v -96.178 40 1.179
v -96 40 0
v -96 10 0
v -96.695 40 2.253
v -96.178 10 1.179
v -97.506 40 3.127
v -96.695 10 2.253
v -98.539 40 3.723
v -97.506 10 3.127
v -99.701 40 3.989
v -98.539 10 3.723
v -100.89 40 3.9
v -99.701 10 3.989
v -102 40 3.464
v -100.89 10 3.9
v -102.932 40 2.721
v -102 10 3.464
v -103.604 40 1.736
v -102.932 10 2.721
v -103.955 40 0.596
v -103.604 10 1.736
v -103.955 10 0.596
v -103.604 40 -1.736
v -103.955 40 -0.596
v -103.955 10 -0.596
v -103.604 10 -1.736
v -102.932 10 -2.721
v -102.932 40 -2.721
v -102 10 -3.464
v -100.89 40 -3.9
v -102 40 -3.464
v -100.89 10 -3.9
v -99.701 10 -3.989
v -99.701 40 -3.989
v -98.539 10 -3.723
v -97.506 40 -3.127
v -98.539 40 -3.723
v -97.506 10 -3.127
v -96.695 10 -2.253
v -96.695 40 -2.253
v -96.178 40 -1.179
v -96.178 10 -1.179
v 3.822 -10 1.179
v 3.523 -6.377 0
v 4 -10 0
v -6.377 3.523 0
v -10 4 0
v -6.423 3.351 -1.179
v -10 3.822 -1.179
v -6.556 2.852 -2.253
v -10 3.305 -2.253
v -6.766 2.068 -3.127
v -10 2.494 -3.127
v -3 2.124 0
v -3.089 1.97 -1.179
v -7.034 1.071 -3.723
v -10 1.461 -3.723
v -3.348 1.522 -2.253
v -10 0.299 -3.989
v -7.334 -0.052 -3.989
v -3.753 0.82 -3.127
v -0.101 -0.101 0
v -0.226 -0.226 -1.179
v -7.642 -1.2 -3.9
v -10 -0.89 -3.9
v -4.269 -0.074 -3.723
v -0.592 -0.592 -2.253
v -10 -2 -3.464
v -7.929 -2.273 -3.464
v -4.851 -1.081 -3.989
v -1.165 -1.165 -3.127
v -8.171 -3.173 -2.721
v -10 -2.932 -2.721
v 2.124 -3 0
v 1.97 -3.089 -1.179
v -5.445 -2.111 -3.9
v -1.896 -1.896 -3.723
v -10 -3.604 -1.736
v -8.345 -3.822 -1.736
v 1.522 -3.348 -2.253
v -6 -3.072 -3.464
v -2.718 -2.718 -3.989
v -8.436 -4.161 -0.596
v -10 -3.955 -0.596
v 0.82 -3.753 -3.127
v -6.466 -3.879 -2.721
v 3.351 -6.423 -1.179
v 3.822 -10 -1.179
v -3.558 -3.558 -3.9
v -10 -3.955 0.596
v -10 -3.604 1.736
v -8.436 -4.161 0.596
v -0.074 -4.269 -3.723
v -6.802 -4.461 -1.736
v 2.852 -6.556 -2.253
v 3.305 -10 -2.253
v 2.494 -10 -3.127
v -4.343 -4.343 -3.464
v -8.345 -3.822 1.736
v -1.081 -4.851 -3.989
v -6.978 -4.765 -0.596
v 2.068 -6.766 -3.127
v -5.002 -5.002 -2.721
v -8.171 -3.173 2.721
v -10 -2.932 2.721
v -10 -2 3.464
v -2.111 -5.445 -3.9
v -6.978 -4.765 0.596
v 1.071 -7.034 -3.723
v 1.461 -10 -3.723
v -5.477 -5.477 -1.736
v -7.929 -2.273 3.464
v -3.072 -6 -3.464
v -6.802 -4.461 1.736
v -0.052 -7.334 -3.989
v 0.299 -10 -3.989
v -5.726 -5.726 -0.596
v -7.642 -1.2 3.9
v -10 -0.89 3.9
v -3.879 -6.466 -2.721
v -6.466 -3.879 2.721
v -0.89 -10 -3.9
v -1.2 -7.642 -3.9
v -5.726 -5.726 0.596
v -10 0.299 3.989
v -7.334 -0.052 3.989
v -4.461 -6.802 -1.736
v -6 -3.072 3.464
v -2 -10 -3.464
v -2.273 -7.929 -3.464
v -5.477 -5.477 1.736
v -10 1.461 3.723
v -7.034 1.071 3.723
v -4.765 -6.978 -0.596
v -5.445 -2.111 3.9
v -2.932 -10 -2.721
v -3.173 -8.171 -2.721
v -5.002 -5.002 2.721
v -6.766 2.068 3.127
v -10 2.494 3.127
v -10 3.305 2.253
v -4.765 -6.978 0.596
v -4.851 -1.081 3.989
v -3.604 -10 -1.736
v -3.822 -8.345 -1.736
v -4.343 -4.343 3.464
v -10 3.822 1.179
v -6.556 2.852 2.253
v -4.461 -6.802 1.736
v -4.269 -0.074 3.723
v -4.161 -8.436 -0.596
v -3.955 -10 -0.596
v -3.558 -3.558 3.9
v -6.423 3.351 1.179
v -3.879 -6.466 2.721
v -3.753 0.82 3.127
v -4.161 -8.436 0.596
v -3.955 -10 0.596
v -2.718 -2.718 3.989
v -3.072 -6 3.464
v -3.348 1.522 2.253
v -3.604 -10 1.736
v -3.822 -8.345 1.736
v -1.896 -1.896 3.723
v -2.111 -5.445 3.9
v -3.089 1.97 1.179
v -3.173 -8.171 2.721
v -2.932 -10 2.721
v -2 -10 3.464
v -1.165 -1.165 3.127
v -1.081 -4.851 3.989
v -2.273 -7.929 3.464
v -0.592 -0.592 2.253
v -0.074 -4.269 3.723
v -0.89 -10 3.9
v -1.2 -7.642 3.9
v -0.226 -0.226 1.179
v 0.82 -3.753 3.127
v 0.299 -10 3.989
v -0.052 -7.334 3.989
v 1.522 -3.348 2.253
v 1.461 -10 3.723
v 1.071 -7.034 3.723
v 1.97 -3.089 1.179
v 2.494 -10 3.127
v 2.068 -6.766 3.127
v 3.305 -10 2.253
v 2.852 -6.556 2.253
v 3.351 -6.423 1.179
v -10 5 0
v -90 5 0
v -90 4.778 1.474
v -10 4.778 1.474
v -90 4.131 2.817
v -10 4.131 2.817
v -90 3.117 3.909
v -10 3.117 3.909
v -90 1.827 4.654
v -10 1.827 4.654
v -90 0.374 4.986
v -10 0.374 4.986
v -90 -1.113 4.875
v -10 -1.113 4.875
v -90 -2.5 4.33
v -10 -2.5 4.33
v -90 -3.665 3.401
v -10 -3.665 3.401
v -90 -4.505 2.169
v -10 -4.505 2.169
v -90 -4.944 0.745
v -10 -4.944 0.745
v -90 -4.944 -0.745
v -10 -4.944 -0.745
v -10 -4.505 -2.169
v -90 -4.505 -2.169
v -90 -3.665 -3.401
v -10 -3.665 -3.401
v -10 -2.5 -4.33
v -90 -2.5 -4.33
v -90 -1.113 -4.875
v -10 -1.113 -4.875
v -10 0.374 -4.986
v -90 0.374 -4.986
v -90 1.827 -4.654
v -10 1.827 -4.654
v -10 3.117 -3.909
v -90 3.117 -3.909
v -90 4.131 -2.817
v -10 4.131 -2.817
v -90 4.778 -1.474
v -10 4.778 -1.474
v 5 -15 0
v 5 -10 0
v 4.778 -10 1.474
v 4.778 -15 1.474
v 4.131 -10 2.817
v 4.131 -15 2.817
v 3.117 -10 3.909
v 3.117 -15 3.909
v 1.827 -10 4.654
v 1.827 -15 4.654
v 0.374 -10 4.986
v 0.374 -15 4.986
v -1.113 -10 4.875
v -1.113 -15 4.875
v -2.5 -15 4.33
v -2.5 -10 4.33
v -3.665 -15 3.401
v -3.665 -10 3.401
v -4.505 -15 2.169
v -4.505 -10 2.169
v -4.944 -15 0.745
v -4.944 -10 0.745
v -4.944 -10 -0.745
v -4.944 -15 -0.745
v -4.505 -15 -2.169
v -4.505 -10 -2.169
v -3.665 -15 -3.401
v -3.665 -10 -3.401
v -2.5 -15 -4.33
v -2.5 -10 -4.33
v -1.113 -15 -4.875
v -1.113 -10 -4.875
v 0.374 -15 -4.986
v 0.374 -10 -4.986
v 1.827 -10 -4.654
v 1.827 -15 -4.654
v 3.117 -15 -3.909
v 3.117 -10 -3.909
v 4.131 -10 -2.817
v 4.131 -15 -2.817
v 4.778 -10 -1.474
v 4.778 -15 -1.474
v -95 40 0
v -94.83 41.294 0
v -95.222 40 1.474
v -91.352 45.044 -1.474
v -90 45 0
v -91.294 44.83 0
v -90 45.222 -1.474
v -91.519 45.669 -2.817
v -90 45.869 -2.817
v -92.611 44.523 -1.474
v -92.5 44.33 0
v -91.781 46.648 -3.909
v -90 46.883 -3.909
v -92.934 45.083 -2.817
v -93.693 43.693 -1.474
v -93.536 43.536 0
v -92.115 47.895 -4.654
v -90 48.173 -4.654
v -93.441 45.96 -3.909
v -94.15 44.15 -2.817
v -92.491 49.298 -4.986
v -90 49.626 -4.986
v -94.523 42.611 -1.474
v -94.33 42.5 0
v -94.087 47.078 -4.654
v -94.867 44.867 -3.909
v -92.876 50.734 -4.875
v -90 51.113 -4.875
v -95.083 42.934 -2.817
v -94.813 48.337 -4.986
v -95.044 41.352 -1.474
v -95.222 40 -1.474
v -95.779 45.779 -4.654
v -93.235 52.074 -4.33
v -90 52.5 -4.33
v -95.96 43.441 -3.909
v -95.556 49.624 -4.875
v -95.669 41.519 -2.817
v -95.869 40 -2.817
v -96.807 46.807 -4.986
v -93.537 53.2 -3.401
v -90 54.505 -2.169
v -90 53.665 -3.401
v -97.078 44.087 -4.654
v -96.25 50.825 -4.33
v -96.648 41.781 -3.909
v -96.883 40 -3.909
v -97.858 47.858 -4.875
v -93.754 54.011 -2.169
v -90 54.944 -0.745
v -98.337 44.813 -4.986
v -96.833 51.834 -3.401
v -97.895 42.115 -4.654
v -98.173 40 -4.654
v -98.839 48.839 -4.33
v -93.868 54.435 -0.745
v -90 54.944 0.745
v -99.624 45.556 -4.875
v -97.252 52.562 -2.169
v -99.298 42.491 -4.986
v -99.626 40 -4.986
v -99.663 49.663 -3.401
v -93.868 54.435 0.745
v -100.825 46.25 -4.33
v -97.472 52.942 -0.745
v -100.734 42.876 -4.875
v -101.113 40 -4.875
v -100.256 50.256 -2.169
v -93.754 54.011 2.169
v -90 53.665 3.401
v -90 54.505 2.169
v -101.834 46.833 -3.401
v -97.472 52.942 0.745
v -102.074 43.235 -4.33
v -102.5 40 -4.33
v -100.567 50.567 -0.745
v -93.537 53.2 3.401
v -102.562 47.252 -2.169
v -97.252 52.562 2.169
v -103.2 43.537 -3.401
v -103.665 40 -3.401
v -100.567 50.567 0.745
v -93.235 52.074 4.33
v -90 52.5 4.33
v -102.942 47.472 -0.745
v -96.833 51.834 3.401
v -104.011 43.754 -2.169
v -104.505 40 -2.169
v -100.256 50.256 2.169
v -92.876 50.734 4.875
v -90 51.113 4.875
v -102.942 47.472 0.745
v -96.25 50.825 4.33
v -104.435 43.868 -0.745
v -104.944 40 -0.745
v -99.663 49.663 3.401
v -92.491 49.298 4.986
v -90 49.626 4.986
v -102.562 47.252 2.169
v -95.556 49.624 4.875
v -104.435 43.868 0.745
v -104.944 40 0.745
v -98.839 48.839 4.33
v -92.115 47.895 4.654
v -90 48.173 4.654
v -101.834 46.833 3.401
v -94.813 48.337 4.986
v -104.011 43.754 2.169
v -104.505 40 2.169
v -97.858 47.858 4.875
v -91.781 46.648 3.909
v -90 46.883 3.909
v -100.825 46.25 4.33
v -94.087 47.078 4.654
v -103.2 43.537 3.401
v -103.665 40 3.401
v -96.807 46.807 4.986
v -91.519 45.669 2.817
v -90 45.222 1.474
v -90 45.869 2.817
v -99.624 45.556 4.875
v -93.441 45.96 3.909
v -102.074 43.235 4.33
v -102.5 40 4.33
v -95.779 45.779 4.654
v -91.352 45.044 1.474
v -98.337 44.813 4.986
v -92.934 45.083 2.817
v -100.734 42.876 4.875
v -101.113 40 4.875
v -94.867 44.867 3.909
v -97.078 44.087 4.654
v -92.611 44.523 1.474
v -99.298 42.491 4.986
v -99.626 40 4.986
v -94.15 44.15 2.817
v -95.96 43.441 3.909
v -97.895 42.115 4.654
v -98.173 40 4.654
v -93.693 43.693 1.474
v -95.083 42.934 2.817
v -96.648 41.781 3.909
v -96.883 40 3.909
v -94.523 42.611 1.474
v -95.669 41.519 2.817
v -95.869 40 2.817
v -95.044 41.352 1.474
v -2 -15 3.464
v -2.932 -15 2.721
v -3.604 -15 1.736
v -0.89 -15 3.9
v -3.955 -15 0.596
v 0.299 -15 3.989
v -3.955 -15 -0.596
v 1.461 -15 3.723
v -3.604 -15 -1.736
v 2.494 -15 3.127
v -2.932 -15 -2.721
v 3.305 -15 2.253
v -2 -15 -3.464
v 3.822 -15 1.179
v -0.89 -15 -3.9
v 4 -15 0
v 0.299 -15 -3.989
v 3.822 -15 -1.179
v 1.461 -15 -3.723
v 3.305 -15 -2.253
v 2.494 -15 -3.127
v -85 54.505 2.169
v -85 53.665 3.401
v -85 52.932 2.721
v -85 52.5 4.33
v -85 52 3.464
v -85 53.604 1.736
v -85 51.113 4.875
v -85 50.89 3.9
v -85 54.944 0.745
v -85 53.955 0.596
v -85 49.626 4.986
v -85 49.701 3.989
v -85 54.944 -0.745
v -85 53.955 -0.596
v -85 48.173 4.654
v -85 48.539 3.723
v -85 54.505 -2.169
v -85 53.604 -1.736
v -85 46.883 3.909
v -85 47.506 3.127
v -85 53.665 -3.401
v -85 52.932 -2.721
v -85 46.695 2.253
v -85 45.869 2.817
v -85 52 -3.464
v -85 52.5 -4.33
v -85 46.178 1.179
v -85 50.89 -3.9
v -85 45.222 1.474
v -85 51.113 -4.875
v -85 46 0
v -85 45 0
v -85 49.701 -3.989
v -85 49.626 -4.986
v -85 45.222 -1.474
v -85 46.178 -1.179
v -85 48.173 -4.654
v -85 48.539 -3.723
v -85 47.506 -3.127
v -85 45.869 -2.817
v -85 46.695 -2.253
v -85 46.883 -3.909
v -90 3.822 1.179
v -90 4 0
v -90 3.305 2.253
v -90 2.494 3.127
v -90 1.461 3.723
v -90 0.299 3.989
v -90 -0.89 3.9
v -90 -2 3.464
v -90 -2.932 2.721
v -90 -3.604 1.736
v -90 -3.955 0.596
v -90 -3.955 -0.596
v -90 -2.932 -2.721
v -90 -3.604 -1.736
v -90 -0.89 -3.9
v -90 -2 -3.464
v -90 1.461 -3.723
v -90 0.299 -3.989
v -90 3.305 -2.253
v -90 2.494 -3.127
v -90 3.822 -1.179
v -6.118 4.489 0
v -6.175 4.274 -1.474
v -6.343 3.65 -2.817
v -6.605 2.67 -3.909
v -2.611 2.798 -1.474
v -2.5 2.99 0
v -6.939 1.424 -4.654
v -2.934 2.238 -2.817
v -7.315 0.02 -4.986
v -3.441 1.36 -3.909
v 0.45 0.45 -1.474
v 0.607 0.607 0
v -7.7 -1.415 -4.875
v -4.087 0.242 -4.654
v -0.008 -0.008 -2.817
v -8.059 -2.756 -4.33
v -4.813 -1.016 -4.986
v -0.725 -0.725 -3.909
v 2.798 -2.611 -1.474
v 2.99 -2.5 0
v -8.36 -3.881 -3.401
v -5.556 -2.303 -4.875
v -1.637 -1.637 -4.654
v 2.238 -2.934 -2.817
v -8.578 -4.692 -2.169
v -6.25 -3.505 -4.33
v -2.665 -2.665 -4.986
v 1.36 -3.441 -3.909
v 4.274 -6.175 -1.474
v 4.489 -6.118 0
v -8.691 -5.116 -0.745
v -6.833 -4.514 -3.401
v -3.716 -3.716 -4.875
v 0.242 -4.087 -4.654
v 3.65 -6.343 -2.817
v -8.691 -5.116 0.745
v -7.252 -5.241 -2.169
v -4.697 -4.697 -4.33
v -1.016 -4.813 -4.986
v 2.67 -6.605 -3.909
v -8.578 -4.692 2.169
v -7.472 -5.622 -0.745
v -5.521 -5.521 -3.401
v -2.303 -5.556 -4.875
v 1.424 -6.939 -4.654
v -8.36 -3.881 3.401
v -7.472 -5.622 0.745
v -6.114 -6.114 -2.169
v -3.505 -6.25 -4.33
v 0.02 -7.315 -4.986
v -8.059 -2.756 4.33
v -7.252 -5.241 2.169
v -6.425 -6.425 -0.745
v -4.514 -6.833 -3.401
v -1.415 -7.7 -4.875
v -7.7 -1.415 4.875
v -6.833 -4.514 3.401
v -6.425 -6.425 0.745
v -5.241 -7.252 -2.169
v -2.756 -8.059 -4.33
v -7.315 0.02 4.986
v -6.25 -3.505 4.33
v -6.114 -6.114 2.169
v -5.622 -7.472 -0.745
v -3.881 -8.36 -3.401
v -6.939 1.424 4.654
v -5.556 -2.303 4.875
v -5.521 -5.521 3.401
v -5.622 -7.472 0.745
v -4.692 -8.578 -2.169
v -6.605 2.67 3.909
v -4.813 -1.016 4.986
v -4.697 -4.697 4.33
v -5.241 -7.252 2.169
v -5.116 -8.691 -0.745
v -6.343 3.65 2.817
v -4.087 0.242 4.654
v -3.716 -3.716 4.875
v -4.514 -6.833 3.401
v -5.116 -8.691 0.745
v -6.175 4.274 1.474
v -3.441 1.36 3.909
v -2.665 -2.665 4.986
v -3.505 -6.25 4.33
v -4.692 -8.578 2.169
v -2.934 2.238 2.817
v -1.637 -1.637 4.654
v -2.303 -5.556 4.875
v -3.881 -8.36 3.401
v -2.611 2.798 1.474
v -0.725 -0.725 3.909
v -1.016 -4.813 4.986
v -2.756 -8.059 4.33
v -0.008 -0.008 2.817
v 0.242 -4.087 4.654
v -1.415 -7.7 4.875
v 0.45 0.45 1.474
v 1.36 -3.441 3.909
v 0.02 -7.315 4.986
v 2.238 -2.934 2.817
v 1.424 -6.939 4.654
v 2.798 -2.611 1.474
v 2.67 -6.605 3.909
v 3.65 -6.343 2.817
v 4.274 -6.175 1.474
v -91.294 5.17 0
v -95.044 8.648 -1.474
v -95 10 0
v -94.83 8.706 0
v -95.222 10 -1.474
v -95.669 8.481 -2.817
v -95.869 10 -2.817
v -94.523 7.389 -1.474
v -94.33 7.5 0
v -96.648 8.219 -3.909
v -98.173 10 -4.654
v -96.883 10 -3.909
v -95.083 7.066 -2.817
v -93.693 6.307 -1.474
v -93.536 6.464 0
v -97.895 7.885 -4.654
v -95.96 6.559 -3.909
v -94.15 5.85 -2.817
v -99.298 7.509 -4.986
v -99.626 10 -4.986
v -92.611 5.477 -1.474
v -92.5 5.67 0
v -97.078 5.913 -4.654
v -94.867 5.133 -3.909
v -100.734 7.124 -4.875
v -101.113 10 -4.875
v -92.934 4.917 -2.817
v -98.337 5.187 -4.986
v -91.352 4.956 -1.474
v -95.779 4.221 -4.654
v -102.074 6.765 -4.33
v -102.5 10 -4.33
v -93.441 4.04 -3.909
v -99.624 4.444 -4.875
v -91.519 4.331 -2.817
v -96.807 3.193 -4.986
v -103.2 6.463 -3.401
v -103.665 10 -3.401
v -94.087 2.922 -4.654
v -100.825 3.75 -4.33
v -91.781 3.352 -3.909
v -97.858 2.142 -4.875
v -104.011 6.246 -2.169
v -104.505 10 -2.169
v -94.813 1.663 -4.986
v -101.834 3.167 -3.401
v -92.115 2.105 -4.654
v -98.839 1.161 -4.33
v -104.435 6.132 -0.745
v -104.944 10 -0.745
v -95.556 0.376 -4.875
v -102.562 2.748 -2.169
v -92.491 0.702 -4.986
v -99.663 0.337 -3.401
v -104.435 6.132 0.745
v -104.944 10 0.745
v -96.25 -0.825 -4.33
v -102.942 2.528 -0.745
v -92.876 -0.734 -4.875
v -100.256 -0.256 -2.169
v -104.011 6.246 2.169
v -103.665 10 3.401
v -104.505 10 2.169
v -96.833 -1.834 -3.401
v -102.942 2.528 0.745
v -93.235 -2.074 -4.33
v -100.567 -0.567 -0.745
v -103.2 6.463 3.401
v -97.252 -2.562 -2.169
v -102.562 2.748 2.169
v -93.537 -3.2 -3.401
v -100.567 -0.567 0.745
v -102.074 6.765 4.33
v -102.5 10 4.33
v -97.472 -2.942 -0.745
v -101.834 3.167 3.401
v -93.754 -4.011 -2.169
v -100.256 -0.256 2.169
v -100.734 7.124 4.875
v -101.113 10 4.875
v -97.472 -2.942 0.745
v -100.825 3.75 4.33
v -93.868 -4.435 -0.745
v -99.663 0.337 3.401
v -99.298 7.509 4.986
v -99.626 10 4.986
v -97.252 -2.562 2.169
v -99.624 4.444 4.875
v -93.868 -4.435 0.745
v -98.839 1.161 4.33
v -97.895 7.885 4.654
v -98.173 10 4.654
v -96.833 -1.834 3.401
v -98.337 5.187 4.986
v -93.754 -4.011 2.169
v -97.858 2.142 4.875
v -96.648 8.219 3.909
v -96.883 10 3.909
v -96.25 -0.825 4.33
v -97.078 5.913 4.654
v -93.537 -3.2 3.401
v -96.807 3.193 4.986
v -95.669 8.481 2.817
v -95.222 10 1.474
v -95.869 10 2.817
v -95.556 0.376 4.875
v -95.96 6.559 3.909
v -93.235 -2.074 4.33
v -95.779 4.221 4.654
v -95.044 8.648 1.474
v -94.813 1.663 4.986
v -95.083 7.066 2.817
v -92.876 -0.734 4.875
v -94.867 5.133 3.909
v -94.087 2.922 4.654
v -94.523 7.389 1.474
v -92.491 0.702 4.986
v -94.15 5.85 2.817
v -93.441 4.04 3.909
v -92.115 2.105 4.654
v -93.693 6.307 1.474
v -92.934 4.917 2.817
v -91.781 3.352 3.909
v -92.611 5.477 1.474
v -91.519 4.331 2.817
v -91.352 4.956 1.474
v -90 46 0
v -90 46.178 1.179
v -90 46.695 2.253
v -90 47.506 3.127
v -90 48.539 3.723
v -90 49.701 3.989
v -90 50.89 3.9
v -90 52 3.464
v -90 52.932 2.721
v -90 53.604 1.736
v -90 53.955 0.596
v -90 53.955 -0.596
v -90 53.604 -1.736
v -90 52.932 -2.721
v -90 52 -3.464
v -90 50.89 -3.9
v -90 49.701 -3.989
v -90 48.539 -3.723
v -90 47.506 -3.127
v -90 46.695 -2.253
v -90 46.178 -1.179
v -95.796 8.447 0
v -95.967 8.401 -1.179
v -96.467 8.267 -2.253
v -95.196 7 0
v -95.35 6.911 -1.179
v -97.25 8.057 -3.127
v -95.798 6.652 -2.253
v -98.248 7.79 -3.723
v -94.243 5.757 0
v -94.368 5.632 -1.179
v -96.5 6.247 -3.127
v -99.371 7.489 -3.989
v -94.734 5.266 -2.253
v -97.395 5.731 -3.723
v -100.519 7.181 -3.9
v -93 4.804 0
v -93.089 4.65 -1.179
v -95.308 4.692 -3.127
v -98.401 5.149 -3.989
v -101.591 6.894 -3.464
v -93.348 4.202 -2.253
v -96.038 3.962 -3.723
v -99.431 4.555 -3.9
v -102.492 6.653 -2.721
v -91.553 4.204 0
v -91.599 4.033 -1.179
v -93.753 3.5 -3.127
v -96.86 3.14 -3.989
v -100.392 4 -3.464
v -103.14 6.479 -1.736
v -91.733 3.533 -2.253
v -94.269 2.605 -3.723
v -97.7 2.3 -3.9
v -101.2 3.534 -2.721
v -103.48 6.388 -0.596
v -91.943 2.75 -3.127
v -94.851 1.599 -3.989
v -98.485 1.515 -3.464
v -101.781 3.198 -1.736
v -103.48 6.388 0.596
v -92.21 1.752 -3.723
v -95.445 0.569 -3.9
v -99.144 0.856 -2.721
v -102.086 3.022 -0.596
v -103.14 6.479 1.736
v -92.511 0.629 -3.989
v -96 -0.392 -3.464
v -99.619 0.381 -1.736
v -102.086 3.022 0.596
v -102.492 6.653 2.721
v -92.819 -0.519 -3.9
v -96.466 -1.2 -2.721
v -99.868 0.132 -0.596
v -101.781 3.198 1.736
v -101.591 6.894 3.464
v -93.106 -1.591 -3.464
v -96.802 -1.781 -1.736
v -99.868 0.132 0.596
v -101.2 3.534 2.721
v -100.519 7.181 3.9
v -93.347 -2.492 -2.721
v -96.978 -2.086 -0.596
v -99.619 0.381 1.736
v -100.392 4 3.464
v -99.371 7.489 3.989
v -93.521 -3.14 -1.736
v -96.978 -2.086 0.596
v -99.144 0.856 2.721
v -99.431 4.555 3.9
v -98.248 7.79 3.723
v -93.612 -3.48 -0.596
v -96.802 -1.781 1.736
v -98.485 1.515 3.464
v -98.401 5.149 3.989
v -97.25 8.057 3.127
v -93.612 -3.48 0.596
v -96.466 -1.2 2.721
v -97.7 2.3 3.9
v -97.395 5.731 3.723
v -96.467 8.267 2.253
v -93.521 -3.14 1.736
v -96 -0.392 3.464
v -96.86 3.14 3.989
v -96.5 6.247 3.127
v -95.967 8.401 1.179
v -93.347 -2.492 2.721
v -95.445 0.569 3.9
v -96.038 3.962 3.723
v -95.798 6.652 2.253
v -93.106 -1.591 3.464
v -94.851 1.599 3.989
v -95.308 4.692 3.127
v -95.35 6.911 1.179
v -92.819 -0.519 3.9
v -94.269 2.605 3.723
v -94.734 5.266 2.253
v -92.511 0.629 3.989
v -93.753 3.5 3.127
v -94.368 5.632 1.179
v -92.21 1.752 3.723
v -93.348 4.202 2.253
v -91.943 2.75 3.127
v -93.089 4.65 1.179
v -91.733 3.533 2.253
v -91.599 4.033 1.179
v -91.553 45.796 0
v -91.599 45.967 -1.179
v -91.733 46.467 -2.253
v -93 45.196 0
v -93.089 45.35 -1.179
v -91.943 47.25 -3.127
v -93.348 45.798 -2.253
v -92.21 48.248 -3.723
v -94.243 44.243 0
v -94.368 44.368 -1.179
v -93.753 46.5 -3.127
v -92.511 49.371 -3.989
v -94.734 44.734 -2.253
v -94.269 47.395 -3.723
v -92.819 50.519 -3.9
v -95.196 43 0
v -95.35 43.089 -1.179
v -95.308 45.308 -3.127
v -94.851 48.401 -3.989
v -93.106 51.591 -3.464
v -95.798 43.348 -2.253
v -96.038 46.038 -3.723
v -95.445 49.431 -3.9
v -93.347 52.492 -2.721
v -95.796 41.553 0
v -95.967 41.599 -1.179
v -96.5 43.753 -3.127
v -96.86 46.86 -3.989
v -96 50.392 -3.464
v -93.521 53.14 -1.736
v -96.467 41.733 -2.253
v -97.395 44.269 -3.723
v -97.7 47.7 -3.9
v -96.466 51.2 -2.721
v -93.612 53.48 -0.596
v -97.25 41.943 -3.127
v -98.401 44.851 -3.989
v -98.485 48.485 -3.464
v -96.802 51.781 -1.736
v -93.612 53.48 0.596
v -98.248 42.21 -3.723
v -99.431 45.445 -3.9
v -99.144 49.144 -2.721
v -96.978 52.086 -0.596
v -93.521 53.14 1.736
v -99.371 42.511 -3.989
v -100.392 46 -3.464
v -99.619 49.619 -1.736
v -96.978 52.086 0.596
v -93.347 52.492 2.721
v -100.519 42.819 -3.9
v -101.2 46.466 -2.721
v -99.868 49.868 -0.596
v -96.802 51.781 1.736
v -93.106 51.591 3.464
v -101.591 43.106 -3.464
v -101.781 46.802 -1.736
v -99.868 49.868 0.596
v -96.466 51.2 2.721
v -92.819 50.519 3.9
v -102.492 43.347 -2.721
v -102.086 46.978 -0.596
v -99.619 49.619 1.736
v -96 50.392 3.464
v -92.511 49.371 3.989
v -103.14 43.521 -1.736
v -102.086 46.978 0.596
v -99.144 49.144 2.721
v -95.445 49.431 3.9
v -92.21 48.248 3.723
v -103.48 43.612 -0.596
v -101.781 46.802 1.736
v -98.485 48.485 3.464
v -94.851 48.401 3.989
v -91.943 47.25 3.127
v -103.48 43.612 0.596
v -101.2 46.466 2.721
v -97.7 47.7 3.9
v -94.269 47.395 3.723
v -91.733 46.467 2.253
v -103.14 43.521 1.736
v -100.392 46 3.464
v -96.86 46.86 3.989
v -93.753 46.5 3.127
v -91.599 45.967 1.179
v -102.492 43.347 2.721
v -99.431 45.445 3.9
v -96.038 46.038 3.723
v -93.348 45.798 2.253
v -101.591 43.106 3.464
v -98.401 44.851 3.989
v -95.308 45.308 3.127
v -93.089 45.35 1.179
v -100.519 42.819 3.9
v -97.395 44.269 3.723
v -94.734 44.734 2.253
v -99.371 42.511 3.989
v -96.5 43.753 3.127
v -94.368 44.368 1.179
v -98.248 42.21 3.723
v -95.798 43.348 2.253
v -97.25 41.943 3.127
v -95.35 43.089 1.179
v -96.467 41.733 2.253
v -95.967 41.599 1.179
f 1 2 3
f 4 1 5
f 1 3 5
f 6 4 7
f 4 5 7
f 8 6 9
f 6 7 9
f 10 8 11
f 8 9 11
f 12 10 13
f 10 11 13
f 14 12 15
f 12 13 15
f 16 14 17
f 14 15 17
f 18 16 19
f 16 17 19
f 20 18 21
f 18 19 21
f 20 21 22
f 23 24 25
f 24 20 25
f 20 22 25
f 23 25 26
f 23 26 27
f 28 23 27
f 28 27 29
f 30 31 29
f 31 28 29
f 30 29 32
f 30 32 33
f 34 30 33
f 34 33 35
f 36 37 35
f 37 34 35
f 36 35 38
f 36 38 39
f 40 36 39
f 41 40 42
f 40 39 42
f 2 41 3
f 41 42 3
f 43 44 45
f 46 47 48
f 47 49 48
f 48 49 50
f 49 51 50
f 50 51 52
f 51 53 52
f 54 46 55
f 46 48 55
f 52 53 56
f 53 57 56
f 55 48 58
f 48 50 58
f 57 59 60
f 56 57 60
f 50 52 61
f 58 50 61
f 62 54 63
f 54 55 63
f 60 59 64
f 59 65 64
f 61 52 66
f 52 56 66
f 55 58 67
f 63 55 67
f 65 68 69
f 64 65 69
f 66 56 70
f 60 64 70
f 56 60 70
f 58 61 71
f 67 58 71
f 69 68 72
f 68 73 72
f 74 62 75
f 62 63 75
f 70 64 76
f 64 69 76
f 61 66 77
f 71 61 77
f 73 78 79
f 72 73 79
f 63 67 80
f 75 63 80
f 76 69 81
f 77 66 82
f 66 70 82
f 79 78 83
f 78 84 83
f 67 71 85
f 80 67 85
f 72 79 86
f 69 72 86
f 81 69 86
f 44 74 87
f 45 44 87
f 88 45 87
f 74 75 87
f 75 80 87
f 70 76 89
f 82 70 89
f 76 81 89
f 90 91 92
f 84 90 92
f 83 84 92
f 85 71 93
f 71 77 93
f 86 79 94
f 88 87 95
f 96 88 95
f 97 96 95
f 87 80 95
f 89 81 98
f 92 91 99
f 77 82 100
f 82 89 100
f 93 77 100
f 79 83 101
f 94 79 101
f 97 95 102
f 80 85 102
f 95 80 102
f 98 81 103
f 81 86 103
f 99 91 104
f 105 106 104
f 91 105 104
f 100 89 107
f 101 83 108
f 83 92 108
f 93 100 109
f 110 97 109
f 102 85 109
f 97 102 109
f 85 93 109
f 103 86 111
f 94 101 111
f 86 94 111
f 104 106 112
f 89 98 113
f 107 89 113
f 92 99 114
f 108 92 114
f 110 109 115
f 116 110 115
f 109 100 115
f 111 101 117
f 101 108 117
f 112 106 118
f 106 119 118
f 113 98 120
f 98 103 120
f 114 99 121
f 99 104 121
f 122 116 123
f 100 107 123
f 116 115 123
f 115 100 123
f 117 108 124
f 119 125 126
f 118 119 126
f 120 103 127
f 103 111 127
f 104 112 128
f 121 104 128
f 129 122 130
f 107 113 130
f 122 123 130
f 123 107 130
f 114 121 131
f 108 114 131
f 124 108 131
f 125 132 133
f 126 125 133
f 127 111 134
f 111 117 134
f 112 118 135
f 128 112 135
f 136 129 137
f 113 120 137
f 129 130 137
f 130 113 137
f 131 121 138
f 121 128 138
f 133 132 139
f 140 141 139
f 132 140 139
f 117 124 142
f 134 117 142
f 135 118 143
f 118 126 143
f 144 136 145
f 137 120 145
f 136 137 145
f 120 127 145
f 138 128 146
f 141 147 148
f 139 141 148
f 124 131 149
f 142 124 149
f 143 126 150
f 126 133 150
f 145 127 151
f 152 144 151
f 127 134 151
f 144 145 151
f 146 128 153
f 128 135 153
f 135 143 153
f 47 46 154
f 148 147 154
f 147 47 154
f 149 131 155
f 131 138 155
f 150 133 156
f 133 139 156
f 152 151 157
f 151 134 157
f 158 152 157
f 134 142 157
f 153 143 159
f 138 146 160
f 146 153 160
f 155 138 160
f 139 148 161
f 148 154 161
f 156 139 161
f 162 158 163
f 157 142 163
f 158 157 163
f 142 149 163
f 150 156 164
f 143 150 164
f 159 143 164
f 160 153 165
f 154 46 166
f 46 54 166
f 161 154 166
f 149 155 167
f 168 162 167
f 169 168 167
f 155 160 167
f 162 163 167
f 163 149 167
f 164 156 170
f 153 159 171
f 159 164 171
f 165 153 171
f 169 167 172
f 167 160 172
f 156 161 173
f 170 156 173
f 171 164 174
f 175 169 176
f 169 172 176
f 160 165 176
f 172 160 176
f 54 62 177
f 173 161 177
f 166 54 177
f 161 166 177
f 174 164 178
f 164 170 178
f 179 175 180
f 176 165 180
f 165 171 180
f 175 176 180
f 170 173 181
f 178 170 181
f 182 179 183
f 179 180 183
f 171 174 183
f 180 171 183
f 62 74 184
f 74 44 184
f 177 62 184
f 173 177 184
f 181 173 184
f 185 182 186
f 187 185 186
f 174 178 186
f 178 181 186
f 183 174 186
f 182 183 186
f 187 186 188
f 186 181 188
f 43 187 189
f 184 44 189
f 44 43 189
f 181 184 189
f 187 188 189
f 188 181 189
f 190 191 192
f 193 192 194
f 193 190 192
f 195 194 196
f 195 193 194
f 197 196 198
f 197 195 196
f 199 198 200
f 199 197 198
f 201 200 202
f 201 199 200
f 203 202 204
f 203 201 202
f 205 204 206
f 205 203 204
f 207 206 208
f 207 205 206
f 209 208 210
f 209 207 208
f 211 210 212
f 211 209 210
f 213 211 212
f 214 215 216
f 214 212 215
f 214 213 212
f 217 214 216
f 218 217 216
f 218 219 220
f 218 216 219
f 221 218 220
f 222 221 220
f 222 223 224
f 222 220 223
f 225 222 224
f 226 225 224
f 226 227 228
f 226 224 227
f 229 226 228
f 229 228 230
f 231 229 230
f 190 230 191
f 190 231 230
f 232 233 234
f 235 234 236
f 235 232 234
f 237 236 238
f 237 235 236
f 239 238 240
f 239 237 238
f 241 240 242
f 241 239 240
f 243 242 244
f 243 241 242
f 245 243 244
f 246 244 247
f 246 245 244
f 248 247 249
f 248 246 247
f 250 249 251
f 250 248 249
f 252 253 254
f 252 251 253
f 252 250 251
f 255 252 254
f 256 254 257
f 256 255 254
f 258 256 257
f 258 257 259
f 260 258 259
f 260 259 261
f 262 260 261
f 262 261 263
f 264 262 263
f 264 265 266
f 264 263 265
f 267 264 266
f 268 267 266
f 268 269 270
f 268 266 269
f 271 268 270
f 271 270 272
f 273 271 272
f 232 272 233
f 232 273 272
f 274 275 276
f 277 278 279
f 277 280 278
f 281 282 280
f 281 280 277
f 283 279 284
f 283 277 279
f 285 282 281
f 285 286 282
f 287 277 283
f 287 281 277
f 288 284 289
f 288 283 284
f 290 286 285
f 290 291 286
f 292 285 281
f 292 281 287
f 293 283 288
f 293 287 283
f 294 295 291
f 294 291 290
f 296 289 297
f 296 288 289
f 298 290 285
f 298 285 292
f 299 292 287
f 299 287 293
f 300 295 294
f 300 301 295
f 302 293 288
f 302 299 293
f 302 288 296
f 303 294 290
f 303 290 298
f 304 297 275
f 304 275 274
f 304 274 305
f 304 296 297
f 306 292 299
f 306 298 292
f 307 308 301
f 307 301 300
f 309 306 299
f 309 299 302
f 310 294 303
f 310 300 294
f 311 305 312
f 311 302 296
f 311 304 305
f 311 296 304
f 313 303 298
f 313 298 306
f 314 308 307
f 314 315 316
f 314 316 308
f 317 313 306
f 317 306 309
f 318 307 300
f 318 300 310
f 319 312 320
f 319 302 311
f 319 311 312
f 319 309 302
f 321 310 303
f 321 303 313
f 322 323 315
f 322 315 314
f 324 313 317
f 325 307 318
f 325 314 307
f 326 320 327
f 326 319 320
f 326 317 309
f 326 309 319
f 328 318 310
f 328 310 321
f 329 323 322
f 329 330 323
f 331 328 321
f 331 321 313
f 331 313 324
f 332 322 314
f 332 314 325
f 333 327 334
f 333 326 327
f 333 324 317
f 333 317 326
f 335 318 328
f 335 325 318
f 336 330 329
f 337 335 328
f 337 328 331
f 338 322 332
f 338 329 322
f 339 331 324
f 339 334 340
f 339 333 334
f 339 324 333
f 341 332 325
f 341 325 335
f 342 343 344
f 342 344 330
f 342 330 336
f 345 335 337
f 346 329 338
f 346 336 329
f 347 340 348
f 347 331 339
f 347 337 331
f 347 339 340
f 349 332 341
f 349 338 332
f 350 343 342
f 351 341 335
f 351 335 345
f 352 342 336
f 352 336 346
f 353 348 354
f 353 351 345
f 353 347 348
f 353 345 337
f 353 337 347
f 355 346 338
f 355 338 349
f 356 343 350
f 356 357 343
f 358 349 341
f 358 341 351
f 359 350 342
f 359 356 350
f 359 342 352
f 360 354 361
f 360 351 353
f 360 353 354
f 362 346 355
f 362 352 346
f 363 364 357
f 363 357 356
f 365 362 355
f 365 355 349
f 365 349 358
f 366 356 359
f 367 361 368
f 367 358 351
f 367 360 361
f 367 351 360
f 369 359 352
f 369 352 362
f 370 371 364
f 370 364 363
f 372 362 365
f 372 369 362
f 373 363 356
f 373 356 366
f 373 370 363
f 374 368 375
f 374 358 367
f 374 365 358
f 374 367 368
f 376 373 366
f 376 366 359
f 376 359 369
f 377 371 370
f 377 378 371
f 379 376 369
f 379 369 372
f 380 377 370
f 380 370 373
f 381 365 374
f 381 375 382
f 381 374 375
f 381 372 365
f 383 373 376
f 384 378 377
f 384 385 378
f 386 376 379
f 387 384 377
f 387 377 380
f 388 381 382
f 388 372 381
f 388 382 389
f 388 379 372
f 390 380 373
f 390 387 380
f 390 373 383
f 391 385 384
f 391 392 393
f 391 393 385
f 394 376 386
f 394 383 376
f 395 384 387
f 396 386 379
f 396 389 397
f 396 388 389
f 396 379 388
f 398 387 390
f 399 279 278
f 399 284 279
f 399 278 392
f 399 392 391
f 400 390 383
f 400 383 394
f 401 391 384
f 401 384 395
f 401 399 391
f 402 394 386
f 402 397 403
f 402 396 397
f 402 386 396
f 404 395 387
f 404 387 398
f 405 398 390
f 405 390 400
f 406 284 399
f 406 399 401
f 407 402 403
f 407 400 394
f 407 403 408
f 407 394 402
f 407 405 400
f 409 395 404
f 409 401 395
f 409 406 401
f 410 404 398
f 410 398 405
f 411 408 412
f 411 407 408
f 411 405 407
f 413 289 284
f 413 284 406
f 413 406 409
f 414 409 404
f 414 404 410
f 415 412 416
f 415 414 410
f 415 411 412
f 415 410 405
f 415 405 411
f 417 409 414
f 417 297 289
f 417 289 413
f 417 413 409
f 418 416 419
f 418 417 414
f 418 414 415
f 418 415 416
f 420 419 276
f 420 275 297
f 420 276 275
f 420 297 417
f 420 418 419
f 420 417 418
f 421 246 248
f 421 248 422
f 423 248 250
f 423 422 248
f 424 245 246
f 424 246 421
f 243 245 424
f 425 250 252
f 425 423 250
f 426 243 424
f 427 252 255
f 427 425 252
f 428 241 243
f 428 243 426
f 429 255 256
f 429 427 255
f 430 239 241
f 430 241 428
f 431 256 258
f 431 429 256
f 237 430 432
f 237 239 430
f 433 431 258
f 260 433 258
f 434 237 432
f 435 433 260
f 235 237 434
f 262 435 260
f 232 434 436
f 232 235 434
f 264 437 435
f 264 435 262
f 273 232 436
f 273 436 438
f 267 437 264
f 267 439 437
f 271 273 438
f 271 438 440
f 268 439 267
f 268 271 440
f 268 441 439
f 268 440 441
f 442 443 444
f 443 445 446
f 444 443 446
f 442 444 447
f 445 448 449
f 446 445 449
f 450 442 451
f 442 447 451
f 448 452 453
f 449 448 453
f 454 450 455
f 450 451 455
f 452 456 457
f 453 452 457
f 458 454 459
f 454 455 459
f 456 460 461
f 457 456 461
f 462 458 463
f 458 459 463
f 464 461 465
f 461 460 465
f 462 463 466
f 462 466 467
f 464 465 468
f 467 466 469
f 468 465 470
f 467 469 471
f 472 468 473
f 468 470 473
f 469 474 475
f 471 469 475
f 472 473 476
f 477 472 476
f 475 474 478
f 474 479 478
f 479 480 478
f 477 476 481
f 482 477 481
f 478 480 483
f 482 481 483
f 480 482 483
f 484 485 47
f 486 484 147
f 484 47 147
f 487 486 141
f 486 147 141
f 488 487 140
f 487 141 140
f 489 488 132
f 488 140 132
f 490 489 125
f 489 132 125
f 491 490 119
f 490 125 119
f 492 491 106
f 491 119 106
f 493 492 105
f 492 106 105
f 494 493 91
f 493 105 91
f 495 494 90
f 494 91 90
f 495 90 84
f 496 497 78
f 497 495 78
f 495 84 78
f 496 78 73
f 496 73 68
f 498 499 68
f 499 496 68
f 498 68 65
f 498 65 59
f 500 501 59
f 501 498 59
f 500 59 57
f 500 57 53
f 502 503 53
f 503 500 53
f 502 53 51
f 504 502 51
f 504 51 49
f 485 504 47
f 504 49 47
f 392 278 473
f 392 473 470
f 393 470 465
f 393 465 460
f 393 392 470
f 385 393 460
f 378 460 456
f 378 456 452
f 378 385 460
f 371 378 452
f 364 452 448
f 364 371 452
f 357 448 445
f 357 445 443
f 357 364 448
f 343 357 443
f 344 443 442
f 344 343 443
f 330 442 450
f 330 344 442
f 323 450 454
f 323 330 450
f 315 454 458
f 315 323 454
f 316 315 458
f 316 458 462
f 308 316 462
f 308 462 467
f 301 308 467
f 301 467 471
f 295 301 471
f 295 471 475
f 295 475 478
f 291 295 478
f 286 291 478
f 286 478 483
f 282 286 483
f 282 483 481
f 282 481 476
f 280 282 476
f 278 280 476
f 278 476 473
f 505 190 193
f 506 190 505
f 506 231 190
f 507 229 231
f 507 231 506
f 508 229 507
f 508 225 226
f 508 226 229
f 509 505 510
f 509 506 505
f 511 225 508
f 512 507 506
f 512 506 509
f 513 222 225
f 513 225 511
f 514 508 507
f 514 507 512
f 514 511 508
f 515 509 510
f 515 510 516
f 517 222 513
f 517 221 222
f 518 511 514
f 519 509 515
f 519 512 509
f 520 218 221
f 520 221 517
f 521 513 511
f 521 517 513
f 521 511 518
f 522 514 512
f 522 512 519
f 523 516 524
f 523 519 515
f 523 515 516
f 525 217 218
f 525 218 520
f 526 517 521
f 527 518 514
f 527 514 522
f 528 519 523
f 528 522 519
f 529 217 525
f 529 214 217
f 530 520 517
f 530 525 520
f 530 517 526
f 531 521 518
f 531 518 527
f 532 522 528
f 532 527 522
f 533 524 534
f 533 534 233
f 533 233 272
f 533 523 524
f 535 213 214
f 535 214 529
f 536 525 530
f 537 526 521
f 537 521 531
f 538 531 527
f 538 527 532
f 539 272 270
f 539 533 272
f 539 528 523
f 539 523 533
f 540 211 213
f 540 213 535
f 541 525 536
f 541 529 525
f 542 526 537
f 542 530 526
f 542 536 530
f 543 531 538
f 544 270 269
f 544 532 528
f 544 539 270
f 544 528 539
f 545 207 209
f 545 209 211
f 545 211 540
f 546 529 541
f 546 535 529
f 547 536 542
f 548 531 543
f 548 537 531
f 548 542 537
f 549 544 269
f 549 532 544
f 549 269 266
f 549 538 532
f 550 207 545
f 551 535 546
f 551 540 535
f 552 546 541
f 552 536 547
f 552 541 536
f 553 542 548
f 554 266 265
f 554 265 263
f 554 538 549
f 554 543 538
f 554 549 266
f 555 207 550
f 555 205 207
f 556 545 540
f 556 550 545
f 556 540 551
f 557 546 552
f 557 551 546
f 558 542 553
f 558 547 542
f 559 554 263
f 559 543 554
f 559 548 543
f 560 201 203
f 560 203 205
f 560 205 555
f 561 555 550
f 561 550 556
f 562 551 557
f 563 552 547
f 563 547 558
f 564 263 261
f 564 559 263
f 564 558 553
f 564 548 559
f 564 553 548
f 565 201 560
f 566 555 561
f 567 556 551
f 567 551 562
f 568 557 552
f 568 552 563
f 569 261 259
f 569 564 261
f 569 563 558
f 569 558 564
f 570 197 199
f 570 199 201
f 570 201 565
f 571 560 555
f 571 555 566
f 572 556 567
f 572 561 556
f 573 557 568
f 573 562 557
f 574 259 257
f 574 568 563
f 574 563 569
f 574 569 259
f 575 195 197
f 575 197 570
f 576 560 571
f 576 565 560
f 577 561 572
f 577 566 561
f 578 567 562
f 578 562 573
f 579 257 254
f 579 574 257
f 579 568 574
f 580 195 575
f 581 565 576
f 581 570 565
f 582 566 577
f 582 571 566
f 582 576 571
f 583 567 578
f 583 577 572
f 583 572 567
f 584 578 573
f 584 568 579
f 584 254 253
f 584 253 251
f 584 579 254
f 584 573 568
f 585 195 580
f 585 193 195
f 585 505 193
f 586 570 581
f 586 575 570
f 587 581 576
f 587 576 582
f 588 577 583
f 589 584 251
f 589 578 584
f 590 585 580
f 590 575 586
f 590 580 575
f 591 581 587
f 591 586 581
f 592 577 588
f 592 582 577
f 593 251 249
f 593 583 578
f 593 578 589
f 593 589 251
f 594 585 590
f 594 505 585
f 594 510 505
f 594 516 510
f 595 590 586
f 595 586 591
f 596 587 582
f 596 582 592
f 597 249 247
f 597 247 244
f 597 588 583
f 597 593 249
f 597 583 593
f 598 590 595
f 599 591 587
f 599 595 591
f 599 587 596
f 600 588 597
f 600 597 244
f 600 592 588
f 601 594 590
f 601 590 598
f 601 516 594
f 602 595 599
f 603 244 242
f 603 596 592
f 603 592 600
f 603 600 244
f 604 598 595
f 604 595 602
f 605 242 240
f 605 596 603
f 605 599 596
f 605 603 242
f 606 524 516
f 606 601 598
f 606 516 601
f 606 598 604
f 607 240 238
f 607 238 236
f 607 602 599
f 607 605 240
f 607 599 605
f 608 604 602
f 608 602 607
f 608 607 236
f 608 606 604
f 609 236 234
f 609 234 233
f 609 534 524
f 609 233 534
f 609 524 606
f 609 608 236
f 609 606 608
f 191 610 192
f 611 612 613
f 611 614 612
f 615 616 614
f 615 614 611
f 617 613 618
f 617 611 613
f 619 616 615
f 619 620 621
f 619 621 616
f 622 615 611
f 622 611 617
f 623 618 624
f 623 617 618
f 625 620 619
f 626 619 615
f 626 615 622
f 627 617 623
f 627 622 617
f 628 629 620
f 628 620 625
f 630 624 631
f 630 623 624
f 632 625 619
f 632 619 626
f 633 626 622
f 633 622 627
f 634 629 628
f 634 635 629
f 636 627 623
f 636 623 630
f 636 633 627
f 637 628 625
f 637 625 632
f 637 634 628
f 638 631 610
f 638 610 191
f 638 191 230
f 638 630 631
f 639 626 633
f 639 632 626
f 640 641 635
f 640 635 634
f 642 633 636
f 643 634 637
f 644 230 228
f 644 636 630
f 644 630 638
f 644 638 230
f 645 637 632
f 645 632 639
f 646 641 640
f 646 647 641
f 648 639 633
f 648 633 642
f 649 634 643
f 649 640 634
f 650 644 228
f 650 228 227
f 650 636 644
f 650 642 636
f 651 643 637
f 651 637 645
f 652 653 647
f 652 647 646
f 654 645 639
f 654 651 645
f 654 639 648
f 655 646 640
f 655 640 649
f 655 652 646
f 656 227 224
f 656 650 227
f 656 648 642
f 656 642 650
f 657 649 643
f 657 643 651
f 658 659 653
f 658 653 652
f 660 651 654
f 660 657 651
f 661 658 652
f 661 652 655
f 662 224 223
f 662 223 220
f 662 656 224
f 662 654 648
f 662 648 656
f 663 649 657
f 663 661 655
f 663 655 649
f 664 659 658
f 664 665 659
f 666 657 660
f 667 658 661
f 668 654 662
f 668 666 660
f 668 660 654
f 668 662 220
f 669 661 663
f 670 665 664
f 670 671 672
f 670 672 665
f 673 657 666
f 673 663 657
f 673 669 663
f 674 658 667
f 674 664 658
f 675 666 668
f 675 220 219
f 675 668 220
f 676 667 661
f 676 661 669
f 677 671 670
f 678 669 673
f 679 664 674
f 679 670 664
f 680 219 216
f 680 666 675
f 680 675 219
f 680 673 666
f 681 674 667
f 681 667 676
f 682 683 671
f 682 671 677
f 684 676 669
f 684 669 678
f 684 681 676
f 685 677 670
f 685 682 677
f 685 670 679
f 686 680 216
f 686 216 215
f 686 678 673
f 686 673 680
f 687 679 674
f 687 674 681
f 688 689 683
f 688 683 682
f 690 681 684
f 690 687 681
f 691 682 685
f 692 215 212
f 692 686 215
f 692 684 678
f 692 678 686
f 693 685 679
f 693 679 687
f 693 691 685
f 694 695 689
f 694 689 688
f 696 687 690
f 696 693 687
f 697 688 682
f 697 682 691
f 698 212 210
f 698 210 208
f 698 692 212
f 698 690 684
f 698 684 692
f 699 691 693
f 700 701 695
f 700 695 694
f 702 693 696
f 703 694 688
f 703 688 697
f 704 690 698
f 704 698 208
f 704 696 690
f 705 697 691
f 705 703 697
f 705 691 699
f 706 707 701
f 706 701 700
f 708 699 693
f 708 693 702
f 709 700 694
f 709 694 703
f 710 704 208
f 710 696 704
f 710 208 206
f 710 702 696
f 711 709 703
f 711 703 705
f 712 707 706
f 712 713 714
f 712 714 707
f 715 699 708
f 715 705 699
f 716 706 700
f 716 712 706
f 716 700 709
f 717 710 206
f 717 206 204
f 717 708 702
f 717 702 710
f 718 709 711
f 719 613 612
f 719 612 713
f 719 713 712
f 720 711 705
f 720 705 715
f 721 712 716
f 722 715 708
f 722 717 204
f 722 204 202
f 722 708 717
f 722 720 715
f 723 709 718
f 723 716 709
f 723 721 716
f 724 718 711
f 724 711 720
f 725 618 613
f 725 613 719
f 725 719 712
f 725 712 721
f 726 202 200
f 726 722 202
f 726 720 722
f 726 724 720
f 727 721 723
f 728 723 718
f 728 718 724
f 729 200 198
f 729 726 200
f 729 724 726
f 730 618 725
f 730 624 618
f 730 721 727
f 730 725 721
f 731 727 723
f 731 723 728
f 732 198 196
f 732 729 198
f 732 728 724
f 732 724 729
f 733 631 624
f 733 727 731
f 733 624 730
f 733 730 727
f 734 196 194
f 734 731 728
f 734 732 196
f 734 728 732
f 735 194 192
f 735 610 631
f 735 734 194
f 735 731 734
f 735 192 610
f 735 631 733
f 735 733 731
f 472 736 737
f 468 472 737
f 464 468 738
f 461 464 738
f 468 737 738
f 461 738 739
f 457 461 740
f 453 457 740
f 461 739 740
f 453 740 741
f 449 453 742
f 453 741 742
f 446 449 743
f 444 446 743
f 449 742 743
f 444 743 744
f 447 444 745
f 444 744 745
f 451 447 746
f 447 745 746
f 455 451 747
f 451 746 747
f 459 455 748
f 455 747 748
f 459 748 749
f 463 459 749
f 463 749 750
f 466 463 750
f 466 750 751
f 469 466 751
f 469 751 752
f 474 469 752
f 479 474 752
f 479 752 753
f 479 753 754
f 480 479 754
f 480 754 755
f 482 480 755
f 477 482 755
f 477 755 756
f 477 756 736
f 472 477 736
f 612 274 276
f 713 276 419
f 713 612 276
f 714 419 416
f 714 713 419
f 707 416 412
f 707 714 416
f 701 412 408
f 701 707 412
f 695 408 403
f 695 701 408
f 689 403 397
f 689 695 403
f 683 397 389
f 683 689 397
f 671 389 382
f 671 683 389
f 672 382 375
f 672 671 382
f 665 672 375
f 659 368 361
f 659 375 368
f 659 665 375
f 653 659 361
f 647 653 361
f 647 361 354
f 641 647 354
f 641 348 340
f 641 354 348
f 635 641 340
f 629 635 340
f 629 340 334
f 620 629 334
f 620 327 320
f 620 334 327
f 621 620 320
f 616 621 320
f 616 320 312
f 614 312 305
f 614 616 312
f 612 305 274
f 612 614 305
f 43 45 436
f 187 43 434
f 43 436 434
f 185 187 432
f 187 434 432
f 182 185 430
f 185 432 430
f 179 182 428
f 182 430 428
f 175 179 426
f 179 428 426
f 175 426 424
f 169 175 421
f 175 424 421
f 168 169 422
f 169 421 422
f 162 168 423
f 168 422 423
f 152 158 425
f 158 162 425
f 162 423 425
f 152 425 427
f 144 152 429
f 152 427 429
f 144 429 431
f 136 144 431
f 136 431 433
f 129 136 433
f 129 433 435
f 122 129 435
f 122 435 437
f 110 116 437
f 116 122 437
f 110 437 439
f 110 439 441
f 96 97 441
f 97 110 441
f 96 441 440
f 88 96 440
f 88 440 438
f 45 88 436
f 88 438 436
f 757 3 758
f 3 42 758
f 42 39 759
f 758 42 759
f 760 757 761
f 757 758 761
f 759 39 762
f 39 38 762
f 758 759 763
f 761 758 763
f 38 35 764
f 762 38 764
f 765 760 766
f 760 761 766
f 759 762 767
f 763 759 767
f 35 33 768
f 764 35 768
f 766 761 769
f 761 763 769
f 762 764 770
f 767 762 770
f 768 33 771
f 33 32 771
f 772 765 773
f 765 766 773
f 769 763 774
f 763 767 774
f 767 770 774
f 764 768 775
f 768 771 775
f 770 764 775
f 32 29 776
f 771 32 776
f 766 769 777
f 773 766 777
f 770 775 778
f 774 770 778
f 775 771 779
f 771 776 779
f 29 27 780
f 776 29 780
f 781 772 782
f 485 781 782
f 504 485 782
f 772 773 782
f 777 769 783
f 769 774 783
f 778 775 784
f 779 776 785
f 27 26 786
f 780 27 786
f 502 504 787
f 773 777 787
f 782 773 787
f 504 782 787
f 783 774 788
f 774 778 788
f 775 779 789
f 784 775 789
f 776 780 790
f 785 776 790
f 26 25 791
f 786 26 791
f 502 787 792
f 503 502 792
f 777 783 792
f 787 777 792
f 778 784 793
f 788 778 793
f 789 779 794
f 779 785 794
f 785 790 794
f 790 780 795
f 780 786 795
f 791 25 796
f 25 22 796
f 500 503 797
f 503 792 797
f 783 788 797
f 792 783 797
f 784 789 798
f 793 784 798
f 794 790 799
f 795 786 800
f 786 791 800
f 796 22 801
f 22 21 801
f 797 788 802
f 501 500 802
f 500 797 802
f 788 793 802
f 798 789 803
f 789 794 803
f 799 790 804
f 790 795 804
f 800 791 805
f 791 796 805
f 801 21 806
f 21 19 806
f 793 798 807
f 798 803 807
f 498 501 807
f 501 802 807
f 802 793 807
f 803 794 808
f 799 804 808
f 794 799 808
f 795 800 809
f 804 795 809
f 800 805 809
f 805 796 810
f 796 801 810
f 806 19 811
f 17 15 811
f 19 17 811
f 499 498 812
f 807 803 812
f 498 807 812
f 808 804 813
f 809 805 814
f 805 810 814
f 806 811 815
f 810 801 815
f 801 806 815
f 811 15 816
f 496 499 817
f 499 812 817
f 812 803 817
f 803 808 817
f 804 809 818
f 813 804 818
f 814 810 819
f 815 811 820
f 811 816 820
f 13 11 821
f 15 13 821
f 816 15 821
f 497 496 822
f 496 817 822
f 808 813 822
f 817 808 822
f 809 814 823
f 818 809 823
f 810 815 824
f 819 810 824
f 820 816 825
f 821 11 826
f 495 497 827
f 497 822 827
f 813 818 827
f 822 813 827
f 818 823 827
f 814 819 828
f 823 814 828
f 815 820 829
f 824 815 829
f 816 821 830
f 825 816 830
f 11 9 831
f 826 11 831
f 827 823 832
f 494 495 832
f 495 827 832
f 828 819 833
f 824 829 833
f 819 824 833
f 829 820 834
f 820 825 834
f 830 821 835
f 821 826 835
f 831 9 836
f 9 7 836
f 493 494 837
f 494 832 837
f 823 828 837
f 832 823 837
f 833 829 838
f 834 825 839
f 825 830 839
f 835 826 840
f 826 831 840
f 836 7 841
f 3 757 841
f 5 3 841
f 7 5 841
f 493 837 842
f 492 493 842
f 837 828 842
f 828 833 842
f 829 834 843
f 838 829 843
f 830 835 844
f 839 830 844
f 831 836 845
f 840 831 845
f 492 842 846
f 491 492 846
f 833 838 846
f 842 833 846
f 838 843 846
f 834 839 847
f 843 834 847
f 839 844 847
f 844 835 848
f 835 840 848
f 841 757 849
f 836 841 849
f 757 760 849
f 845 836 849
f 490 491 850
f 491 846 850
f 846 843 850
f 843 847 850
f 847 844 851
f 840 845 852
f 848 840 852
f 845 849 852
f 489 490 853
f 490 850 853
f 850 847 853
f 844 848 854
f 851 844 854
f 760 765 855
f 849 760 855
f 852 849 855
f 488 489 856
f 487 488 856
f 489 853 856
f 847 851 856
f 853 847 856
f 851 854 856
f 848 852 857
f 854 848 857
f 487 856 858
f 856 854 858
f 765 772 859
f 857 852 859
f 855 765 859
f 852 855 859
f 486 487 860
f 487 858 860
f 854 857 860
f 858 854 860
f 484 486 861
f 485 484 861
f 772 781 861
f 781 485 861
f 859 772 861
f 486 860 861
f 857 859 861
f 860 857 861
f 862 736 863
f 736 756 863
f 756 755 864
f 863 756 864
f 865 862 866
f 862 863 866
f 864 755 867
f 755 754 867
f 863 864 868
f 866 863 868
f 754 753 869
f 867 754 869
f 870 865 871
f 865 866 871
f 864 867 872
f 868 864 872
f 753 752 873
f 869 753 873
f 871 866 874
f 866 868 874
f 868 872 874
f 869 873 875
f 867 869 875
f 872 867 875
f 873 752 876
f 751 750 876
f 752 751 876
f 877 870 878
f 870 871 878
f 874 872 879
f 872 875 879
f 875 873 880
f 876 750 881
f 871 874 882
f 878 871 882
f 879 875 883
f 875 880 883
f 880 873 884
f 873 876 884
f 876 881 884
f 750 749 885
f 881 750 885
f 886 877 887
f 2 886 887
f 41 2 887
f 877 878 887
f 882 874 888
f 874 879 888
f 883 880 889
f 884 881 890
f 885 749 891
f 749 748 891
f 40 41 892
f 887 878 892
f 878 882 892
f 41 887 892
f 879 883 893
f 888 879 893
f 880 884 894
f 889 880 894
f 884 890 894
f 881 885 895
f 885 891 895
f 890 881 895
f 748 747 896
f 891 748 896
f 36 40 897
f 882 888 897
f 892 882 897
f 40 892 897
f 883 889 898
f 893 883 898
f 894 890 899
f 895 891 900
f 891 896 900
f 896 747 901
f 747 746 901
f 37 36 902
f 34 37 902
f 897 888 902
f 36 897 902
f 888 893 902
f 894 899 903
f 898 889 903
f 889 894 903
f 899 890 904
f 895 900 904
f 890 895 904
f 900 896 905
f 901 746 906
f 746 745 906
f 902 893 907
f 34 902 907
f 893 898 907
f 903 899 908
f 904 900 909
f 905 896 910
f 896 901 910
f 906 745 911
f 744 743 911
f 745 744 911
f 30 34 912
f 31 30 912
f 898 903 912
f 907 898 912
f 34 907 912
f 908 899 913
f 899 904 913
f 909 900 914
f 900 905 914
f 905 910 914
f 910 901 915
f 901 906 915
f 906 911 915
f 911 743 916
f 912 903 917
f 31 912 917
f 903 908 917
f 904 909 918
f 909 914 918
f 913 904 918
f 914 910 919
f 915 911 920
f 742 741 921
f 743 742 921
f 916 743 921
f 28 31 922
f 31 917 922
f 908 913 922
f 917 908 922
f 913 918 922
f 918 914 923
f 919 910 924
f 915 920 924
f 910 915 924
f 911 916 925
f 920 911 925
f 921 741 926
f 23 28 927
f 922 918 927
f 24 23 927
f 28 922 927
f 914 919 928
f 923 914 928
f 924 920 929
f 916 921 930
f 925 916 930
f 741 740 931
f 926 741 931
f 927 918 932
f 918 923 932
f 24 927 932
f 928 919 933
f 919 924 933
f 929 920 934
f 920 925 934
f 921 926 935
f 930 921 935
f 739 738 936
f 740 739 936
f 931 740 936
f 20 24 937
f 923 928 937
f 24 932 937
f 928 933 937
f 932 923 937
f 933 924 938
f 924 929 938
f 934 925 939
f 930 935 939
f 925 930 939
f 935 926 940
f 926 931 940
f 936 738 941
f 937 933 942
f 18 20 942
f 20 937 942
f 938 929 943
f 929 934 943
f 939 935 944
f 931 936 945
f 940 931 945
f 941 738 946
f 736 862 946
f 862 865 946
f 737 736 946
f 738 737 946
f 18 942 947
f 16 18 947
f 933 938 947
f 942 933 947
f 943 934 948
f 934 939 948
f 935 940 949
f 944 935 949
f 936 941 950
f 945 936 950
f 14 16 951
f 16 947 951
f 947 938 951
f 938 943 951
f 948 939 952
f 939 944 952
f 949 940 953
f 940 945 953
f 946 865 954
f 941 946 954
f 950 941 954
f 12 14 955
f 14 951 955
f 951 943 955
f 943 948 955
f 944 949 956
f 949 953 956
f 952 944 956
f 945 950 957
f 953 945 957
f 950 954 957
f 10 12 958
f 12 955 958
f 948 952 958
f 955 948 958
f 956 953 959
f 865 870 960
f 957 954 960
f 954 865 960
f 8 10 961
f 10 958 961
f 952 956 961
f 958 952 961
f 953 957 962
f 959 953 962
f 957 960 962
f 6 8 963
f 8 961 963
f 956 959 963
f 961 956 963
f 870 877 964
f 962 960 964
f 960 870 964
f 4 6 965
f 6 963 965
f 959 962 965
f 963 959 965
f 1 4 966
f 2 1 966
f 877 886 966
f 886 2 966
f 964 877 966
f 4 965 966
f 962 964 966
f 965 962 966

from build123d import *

# Parameters (mm, degrees)
SWEEP_1_PROFILE_R   = 5
SWEEP_1_PROFILE_R_2 = 4


with BuildPart() as part:
    # 扫描-薄件1: sweep along a path in 草图1
    with BuildLine(Plane.XY) as sweep_1_path:
        Line((-85, 50), (-90, 50))
        ThreePointArc((-90, 50), (-97.071067812, 47.071067812), (-100, 40))
        Line((-100, 40), (-100, 10))
        ThreePointArc((-100, 10), (-97.071067812, 2.928932188), (-90, 0))
        Line((-90, 0), (-10, 0))
        ThreePointArc((-10, 0), (-2.928932188, -2.928932188), (0, -10))
        Line((0, -10), (0, -15))
    # 扫描-薄件1 profile (on start of the path) → 扫描-薄件1 (sweep)
    with BuildSketch(Plane(origin=(-85, 50, 0), x_dir=(0, -1, 0), z_dir=(-1, 0, 0))):
        Circle(SWEEP_1_PROFILE_R)
        Circle(SWEEP_1_PROFILE_R_2, mode=Mode.SUBTRACT)
    sweep(path=sweep_1_path.line)


solid = part.part
